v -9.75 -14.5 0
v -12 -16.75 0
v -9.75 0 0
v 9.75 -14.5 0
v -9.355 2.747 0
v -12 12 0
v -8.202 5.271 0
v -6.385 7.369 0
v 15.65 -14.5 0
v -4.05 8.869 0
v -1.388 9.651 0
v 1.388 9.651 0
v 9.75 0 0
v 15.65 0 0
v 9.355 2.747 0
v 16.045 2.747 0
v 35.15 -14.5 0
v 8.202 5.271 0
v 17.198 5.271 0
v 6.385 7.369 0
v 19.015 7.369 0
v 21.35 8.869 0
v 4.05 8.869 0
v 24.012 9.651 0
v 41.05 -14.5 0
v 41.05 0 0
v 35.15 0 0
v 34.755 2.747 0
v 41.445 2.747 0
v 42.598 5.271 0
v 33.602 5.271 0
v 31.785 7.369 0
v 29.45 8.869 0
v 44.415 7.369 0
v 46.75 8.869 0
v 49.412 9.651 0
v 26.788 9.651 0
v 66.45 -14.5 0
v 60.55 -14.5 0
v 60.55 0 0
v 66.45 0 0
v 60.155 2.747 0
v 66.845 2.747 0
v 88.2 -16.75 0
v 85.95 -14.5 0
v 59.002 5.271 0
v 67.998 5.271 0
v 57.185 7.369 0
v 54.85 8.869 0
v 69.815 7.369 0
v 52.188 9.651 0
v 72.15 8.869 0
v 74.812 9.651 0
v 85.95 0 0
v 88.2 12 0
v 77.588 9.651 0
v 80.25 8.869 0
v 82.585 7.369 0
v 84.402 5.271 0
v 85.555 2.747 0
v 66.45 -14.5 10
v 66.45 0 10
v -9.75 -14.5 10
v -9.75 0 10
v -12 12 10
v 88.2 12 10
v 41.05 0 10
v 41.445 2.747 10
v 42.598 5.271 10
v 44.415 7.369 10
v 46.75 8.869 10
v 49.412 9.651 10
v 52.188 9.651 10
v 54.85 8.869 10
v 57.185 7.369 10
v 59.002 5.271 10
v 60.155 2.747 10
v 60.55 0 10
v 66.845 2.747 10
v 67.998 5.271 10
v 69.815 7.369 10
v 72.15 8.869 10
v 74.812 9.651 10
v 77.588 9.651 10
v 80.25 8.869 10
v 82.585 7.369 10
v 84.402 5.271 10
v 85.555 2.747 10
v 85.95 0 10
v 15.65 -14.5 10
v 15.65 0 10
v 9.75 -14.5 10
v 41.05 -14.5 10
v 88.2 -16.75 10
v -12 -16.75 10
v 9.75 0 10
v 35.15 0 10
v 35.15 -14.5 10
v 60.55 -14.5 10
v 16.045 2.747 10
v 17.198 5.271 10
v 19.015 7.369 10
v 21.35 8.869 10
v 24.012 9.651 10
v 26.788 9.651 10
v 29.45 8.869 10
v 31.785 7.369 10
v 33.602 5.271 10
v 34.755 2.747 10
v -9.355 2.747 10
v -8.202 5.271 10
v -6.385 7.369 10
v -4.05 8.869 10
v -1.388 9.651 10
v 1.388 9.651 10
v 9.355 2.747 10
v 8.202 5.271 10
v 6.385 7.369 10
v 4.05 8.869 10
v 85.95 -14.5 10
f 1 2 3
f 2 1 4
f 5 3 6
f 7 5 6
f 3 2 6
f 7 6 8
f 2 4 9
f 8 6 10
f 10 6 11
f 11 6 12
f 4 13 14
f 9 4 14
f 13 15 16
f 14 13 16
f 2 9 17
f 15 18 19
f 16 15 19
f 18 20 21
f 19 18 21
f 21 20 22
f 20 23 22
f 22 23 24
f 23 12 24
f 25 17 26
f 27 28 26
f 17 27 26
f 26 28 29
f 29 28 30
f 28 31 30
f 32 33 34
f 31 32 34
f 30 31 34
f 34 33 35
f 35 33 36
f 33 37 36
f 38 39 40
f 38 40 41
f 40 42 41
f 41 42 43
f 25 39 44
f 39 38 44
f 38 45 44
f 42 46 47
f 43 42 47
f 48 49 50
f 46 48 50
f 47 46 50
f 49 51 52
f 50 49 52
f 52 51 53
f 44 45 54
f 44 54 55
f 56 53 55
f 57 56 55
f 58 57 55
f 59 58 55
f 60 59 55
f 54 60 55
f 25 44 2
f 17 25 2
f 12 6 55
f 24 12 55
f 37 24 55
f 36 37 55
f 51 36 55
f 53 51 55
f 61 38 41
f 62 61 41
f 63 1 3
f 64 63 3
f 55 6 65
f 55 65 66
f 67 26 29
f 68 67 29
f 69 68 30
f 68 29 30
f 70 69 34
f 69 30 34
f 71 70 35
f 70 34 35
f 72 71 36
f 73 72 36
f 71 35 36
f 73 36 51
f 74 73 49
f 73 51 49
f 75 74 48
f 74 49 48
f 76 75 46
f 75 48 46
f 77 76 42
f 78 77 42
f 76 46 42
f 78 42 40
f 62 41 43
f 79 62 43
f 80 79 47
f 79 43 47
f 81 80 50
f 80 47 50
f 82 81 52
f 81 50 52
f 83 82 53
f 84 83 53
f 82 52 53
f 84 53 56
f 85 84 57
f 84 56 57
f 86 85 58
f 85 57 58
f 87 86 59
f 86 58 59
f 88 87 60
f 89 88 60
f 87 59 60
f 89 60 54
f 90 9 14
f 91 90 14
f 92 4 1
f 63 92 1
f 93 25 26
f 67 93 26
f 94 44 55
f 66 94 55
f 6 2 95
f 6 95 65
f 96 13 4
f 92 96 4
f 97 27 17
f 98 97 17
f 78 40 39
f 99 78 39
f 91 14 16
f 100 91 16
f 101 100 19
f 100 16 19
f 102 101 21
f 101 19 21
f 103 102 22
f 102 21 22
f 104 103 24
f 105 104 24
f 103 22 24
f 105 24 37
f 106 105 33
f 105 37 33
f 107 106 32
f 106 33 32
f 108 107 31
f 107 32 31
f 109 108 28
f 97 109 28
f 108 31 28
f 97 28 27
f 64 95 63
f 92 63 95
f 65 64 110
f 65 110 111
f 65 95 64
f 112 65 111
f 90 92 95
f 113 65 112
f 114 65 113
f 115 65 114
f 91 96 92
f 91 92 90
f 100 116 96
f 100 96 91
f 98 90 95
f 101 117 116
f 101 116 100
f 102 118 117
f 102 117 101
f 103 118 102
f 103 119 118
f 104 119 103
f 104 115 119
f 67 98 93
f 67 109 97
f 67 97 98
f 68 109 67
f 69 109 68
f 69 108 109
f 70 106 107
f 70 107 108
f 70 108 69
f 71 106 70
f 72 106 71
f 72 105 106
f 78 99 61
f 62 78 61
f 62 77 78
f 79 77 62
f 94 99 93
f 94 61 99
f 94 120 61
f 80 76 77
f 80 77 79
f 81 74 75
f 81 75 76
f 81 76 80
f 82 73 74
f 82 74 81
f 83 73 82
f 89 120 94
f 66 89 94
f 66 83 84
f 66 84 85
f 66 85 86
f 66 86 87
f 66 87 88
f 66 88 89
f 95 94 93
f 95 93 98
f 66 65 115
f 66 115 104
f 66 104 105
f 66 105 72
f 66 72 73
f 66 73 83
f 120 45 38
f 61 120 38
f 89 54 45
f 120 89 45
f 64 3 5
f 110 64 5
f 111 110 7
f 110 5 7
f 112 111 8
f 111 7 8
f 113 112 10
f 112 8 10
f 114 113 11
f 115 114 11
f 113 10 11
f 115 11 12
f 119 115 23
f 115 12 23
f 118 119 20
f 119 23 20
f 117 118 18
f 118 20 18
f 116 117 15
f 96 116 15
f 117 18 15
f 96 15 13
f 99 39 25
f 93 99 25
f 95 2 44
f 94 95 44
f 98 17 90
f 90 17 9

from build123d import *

# Parameters (mm, degrees)
SKETCH2_W           = 100.2
SKETCH2_H           = 28.75
BOSS_EXTRUDE1_DEPTH = 10


with BuildPart() as part:
    # Sketch2 → Boss-Extrude1 (new body)
    with BuildSketch(Plane.XY):
        with Locations((38.1, -2.375)):
            Rectangle(SKETCH2_W, SKETCH2_H)
        with BuildLine():
            Line((-9.75, -14.5), (-9.75, 0))
            ThreePointArc((-9.75, 0), (0, 9.75), (9.75, 0))
            Line((9.75, 0), (9.75, -14.5))
            Line((9.75, -14.5), (-9.75, -14.5))
        make_face(mode=Mode.SUBTRACT)
        with BuildLine():
            Line((15.65, -14.5), (15.65, 0))
            ThreePointArc((15.65, 0), (25.4, 9.75), (35.15, 0))
            Line((35.15, 0), (35.15, -14.5))
            Line((35.15, -14.5), (15.65, -14.5))
        make_face(mode=Mode.SUBTRACT)
        with BuildLine():
            Line((41.05, -14.5), (41.05, 0))
            ThreePointArc((41.05, 0), (50.8, 9.75), (60.55, 0))
            Line((60.55, 0), (60.55, -14.5))
            Line((60.55, -14.5), (41.05, -14.5))
        make_face(mode=Mode.SUBTRACT)
        with BuildLine():
            Line((66.45, -14.5), (66.45, 0))
            ThreePointArc((66.45, 0), (76.2, 9.75), (85.95, 0))
            Line((85.95, 0), (85.95, -14.5))
            Line((85.95, -14.5), (66.45, -14.5))
        make_face(mode=Mode.SUBTRACT)
    extrude(amount=BOSS_EXTRUDE1_DEPTH)


solid = part.part
